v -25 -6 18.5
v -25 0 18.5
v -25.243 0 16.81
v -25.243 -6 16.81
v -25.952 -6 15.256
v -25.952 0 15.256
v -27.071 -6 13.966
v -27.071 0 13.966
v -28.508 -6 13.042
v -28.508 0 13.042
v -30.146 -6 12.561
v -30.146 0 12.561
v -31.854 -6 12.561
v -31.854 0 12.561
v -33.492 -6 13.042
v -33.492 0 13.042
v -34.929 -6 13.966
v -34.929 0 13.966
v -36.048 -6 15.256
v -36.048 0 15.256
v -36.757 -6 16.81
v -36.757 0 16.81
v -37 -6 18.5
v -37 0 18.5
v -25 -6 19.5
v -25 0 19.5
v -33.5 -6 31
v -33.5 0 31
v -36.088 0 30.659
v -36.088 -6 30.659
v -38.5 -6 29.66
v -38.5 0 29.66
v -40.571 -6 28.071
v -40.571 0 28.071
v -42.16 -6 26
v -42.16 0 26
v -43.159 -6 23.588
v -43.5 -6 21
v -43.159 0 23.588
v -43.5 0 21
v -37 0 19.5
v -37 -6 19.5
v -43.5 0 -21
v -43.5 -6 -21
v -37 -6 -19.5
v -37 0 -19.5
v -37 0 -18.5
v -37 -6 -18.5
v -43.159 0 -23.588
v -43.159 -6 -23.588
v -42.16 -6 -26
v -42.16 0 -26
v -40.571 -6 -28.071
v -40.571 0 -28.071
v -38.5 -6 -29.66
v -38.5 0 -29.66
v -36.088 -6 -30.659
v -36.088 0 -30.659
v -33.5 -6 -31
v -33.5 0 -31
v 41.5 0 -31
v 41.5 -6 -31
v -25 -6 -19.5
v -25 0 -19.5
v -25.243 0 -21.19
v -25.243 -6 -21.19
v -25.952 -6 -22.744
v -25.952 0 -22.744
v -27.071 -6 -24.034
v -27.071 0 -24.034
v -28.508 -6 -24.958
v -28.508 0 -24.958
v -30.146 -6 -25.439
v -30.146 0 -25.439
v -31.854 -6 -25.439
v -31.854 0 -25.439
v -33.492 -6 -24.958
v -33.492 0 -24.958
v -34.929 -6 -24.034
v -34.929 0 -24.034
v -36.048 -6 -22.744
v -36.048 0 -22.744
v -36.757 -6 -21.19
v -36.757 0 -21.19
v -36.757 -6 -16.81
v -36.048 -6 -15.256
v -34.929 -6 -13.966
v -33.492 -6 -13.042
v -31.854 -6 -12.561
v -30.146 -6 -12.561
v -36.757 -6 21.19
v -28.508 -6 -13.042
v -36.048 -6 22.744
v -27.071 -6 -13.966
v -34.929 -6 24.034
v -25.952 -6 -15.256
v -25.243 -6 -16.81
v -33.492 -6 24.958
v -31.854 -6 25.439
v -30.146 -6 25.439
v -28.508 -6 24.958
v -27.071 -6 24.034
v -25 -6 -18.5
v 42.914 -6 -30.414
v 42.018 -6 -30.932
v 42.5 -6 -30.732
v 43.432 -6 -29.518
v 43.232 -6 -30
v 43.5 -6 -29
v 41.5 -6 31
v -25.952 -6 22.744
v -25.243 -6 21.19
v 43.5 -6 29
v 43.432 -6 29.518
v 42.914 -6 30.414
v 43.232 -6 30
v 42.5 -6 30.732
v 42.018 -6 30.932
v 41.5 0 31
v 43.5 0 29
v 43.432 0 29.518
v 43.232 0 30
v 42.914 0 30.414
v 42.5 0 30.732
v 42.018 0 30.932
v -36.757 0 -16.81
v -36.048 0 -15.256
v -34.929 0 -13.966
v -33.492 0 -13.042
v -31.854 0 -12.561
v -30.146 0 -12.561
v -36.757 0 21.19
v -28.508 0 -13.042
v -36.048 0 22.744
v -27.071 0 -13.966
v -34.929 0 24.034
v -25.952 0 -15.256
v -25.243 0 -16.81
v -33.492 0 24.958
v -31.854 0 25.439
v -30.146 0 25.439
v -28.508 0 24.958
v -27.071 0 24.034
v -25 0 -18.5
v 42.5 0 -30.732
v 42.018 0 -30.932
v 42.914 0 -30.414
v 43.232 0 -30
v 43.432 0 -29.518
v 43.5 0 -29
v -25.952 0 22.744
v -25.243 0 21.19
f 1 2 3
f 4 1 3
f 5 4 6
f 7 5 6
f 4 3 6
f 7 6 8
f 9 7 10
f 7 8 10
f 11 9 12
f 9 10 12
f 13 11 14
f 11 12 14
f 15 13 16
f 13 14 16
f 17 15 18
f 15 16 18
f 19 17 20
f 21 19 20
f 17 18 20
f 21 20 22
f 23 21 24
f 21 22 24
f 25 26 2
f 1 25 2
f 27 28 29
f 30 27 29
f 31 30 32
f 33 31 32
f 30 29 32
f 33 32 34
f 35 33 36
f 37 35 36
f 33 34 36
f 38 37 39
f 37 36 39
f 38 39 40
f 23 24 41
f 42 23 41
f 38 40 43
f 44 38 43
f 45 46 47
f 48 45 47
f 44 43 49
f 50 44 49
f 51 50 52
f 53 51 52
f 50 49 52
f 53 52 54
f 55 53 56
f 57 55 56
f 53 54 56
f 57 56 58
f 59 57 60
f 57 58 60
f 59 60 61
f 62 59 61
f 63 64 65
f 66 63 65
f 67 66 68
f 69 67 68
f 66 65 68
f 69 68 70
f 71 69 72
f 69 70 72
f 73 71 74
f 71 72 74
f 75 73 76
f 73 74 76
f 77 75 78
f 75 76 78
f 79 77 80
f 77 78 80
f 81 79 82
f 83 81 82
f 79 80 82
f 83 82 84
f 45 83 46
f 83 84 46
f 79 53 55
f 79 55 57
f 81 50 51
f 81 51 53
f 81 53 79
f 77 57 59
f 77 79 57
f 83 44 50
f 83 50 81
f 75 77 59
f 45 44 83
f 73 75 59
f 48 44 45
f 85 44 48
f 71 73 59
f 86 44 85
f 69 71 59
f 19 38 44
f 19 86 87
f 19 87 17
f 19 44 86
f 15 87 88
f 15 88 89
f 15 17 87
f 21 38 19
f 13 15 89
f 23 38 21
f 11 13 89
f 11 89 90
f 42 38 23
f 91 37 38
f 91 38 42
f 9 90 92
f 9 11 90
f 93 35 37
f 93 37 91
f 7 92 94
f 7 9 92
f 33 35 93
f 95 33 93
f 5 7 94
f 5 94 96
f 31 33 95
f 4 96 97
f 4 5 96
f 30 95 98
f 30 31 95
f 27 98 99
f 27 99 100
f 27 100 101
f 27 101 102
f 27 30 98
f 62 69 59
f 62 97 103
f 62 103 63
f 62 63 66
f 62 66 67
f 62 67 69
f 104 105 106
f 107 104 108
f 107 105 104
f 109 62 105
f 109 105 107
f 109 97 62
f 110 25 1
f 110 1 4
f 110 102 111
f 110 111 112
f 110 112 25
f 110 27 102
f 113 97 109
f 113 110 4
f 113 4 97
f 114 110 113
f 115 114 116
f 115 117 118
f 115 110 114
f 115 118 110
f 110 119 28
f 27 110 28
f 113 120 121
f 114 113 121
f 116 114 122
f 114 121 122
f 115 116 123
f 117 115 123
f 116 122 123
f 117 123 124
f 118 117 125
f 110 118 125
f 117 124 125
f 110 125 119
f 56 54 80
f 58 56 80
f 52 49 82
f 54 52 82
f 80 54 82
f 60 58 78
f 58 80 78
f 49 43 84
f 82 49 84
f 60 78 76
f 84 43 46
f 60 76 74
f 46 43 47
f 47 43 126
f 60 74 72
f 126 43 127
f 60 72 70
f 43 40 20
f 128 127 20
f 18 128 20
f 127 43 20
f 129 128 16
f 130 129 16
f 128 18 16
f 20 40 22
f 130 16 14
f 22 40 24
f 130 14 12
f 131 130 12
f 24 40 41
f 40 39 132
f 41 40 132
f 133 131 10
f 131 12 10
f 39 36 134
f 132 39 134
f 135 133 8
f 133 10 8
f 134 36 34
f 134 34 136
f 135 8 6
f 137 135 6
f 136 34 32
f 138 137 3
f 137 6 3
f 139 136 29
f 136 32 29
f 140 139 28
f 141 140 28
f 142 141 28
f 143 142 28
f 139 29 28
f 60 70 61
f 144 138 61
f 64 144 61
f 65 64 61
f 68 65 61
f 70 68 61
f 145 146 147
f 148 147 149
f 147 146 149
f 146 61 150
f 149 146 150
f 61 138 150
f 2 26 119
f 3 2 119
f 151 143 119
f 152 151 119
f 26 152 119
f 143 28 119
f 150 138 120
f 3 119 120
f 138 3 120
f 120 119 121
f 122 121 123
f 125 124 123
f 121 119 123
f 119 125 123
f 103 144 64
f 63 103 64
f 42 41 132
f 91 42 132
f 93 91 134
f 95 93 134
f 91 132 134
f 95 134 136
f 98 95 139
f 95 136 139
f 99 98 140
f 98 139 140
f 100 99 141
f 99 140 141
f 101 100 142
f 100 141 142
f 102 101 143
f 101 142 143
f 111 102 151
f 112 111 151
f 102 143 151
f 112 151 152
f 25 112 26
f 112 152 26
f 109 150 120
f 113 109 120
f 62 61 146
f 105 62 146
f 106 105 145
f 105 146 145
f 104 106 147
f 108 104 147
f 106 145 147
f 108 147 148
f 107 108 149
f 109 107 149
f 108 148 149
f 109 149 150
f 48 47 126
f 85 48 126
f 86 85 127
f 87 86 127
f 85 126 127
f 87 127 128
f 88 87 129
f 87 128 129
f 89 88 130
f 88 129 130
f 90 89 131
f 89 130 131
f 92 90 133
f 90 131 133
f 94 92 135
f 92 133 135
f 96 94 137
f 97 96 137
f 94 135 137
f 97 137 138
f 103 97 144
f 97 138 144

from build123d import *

# Parameters (mm, degrees)
F1_DEPTH = 6


with BuildPart() as f1:
    # F0 (on Front) → F1 (new body)
    with BuildSketch(Plane.XZ):
        with BuildLine():
            ThreePointArc((-43.5, -21), (-40.571068, -28.071068), (-33.5, -31))
            Line((-33.5, -31), (41.5, -31))
            ThreePointArc((41.5, -31), (42.914214, -30.414214), (43.5, -29))
            Line((43.5, -29), (43.5, 29))
            ThreePointArc((43.5, 29), (42.914214, 30.414214), (41.5, 31))
            Line((41.5, 31), (-33.5, 31))
            ThreePointArc((-33.5, 31), (-40.571068, 28.071068), (-43.5, 21))
            Line((-43.5, 21), (-43.5, -21))
        make_face()
        with BuildLine():
            ThreePointArc((-37, -18.5), (-31, -12.5), (-25, -18.5))
            Line((-25, -18.5), (-25, -19.5))
            ThreePointArc((-25, -19.5), (-31, -25.5), (-37, -19.5))
            Line((-37, -19.5), (-37, -18.5))
        make_face(mode=Mode.SUBTRACT)
        with BuildLine():
            ThreePointArc((-25, 18.5), (-31, 12.5), (-37, 18.5))
            Line((-37, 18.5), (-37, 19.5))
            ThreePointArc((-37, 19.5), (-31, 25.5), (-25, 19.5))
            Line((-25, 19.5), (-25, 18.5))
        make_face(mode=Mode.SUBTRACT)
    extrude(amount=F1_DEPTH)


solid = f1.part
